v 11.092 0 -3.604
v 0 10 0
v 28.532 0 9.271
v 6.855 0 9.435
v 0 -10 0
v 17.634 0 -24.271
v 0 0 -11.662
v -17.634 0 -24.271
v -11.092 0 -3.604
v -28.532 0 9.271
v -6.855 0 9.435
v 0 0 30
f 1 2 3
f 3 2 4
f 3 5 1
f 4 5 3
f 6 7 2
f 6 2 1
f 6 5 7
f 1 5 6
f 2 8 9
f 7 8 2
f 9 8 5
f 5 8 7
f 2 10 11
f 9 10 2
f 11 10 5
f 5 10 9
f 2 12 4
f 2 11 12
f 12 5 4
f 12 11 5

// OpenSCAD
$vpt = [0,0,0];

// edges on the star
ticks = 5;

// how long the edges should be (in mm)
length = 30;

thickness = 1.0;
wideness = 1.0;

color("gold")
for ( i = [ 1 : ticks ] ){
    rotate( 360 / ticks * i, [ 0, 1, 0 ] )
    scale( [ wideness, thickness, 1 ] )
    cylinder( length, 10, 0, $fn = 4 );
}
